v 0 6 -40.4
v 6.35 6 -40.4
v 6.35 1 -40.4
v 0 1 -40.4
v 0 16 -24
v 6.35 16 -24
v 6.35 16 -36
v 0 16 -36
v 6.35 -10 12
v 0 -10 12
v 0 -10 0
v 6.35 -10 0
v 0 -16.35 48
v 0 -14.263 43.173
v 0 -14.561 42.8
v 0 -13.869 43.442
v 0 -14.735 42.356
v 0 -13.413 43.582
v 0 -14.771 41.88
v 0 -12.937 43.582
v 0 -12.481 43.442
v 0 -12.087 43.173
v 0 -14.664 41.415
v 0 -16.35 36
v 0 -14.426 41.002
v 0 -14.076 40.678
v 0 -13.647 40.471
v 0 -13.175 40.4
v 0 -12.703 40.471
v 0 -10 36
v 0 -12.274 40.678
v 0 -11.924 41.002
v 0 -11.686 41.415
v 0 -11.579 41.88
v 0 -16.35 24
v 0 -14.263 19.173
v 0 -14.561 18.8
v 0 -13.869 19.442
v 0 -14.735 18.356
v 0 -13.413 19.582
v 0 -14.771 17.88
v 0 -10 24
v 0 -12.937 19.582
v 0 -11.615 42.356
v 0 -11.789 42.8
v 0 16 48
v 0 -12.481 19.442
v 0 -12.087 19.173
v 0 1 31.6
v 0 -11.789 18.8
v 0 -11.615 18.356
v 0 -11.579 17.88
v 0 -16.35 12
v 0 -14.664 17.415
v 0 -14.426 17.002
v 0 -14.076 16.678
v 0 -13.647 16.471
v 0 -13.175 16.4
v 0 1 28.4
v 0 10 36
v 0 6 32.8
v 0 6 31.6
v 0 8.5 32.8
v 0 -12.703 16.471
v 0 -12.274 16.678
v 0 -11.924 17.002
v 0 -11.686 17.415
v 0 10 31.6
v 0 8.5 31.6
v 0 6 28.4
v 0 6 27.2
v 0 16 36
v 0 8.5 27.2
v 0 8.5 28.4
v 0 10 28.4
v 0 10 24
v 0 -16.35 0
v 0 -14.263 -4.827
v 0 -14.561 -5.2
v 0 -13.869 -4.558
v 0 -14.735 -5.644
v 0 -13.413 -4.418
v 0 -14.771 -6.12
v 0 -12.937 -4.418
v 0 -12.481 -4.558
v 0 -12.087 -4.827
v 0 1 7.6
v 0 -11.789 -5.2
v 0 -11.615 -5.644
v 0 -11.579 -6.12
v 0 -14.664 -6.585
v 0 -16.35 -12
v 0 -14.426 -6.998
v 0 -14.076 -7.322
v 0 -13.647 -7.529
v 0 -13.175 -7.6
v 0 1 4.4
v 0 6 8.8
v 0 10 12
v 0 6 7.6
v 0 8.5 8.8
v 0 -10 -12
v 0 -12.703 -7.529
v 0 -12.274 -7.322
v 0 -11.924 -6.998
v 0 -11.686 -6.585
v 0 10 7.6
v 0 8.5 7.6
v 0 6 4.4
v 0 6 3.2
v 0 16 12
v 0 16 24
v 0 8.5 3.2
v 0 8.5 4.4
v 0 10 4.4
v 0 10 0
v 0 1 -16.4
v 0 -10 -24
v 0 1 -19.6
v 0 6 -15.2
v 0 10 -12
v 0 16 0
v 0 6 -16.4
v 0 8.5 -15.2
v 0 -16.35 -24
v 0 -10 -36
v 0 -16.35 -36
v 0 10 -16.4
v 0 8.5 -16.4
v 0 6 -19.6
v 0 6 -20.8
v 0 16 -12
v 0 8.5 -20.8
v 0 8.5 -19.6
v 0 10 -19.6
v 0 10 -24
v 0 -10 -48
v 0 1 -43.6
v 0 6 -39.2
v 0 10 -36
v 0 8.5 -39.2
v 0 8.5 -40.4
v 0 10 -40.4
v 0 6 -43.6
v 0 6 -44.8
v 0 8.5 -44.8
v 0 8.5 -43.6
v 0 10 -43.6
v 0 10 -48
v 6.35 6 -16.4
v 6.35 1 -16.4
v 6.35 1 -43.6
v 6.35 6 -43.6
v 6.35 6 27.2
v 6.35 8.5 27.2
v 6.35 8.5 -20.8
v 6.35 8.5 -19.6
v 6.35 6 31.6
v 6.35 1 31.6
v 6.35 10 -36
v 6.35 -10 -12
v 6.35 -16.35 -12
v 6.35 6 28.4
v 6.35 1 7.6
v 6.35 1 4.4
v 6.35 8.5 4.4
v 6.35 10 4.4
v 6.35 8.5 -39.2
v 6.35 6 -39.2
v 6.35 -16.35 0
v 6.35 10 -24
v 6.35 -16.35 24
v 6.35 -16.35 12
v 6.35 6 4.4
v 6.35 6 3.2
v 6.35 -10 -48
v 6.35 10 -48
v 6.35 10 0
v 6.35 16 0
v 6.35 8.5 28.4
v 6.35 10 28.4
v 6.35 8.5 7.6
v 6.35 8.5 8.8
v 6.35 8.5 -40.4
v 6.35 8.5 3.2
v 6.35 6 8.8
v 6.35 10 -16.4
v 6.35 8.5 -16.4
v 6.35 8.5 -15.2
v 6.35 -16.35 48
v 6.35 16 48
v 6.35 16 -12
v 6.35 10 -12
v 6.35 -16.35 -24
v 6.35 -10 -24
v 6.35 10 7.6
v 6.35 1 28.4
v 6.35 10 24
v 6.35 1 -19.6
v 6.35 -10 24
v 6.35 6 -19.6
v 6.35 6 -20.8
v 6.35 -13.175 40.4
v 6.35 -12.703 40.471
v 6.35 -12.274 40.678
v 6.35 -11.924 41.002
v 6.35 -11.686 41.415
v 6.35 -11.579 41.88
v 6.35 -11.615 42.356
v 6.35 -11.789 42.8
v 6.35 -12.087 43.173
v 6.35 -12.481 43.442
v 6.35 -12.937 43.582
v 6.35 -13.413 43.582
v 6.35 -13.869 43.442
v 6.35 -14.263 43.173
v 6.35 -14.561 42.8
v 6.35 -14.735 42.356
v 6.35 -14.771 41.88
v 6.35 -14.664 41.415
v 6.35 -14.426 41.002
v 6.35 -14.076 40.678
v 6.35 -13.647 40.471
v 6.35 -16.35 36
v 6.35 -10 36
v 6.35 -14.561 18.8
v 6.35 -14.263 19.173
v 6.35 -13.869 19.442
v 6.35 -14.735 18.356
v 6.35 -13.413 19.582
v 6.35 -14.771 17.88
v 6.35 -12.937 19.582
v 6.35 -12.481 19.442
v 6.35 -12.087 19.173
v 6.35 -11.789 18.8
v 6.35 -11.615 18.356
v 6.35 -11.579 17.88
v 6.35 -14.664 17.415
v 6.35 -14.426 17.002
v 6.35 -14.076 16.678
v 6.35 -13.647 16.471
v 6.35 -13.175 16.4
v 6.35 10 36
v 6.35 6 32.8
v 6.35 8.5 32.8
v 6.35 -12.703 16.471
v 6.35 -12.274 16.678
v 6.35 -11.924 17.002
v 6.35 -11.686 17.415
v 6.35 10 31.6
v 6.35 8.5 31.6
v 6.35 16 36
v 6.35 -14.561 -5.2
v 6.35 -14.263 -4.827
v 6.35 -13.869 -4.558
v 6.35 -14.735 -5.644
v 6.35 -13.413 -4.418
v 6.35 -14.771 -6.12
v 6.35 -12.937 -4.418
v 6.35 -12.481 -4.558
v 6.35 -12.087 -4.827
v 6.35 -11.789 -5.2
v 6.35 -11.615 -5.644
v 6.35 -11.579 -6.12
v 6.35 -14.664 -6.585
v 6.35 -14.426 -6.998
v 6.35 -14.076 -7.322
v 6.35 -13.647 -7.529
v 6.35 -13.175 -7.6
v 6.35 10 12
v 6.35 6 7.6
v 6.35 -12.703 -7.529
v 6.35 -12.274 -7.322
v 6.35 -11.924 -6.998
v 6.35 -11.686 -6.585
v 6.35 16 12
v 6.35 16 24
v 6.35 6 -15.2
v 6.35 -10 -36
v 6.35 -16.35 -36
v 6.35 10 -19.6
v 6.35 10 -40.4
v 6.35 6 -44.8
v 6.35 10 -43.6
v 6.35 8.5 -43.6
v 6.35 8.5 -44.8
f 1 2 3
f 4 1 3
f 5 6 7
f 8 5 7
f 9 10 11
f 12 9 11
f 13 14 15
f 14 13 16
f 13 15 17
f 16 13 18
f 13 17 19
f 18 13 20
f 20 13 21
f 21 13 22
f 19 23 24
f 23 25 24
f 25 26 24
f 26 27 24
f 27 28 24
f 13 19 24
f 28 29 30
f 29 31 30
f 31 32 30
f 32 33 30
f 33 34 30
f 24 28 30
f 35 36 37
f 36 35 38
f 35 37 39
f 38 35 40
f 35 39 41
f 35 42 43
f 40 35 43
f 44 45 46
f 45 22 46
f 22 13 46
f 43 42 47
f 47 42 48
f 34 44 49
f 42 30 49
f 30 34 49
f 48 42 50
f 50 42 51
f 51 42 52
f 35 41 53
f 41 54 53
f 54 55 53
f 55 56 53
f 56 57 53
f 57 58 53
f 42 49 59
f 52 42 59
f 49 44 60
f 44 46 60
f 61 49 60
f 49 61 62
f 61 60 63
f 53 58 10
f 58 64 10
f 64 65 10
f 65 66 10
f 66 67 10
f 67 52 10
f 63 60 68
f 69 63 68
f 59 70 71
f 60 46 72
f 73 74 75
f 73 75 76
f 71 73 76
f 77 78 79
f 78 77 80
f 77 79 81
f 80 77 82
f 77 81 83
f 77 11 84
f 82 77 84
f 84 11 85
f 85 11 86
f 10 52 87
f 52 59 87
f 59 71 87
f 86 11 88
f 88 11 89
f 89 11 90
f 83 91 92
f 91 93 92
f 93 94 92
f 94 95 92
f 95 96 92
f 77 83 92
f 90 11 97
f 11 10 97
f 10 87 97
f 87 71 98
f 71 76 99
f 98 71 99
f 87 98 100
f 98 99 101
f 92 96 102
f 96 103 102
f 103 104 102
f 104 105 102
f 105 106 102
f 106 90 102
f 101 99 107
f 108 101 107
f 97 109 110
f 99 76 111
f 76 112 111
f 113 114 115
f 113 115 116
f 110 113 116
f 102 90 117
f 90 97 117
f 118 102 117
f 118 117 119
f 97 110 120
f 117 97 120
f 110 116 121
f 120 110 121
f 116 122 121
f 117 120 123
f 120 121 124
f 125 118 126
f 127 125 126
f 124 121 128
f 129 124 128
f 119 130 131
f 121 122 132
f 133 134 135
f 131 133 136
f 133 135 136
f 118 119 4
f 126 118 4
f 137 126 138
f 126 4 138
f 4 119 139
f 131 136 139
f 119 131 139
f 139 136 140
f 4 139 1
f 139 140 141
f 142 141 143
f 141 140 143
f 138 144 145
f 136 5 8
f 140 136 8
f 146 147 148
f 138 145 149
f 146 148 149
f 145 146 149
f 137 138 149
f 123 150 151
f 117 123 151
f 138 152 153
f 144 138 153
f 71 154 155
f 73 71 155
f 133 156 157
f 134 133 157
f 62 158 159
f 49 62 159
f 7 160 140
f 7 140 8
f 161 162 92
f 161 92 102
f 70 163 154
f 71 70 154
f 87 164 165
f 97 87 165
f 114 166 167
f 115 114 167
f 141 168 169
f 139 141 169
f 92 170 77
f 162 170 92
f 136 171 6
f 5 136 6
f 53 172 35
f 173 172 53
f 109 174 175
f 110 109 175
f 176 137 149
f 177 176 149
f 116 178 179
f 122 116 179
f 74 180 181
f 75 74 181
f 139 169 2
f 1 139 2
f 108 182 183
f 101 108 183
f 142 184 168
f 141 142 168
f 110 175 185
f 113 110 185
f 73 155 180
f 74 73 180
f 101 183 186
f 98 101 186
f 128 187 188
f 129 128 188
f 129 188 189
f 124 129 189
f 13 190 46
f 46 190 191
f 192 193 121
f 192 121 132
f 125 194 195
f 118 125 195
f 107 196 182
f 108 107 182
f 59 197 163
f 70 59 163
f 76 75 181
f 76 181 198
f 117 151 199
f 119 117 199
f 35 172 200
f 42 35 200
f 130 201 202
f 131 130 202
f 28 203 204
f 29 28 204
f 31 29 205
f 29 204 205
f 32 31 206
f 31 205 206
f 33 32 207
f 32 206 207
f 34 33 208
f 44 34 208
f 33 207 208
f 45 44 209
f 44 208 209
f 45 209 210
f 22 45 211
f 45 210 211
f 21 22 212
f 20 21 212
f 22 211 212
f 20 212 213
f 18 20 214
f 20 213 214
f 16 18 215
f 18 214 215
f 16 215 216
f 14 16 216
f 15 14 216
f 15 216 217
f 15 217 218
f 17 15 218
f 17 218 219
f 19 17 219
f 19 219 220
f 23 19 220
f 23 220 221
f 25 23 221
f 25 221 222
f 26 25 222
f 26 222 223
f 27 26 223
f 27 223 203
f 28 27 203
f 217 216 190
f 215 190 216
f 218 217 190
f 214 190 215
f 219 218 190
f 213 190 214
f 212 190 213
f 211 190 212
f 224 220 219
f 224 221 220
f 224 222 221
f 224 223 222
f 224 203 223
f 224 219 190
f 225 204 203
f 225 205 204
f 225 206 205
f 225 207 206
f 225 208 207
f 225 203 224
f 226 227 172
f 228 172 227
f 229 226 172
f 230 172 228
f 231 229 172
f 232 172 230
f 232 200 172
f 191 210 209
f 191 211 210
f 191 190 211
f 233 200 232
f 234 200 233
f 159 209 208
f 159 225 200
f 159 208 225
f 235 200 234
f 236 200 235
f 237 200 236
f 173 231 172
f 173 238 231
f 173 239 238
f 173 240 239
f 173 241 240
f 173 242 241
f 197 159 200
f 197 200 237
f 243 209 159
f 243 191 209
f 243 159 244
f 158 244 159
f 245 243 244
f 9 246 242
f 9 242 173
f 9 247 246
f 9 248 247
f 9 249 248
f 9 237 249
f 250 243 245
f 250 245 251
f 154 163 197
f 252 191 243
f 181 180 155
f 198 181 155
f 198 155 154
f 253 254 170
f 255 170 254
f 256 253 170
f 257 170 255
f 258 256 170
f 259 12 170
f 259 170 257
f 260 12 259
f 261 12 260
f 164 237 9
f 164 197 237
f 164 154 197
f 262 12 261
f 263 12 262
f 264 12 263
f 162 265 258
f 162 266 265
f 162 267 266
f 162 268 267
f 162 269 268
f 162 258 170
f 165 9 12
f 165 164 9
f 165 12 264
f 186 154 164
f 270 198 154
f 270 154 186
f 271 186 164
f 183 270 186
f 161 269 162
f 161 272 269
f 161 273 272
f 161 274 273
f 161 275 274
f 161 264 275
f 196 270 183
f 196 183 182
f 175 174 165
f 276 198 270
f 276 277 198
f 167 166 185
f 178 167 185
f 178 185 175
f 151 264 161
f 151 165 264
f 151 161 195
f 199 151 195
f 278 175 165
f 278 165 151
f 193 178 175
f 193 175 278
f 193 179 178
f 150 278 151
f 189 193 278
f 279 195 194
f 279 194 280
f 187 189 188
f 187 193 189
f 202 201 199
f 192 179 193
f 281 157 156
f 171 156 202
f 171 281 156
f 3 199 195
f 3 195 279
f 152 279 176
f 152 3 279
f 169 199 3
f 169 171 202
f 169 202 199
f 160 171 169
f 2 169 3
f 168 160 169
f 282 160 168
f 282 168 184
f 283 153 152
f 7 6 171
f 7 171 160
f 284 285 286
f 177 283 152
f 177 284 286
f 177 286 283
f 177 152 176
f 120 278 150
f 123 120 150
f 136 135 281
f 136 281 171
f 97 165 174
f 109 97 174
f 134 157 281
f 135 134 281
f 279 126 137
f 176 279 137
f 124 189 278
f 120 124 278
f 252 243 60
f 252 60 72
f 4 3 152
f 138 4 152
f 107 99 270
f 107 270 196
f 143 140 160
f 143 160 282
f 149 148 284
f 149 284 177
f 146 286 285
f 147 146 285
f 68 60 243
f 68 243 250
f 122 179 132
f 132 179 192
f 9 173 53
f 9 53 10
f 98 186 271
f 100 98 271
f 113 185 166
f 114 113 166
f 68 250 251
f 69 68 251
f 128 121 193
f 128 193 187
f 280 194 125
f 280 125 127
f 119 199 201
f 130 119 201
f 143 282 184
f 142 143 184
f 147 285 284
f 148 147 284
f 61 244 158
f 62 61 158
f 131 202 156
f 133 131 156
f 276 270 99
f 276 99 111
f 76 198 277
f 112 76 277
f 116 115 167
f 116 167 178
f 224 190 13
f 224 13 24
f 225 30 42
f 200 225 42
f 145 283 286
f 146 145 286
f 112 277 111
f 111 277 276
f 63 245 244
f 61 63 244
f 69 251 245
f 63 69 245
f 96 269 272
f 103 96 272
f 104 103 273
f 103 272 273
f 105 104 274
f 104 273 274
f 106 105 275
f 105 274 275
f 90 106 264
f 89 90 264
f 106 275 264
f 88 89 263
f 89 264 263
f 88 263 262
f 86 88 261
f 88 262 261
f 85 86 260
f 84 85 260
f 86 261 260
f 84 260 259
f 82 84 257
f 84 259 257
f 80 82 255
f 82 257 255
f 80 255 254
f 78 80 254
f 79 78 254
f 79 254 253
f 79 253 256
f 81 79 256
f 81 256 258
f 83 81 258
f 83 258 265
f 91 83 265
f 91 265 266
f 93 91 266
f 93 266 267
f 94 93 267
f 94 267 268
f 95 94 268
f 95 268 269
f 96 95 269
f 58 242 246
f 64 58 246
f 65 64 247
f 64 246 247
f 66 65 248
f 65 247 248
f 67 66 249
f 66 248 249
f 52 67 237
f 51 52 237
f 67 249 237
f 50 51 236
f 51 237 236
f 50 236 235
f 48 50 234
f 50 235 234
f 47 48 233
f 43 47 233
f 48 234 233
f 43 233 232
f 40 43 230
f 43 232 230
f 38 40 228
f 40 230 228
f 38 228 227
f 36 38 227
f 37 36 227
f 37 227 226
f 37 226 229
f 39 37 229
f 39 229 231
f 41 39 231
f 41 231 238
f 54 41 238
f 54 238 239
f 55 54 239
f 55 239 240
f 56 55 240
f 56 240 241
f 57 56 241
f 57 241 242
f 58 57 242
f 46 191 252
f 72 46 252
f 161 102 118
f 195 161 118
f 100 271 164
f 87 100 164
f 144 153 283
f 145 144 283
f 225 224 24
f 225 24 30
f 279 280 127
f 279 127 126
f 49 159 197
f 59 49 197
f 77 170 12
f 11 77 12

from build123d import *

# Parameters (mm, degrees)
SKETCH1_W           = 96
SKETCH1_H           = 20
BOSS_EXTRUDE1_DEPTH = 6.35
SKETCH2_W           = 12
SKETCH2_H           = 6
SKETCH2_H_2         = 6.35
BOSS_EXTRUDE2_DEPTH = 6.35
SKETCH3_R           = 1.6
CUT_EXTRUDE1_DEPTH  = 10


with BuildPart() as part:
    # Sketch1 → Boss-Extrude1 (new body)
    with BuildSketch(Plane(origin=(0, 0, 0), x_dir=(0, 0, -1), z_dir=(1, 0, 0))):
        Rectangle(SKETCH1_W, SKETCH1_H)
    extrude(amount=BOSS_EXTRUDE1_DEPTH)

    # Sketch2 → Boss-Extrude2 (add)
    with BuildSketch(Plane(origin=(6.35, 0, 0), x_dir=(0, 0, -1), z_dir=(1, 0, 0))):
        with Locations((-18, 13)):
            Rectangle(SKETCH2_W, SKETCH2_H)
        with Locations((-42, 13)):
            Rectangle(SKETCH2_W, SKETCH2_H)
        with Locations((6, 13)):
            Rectangle(SKETCH2_W, SKETCH2_H)
        with Locations((30, 13)):
            Rectangle(SKETCH2_W, SKETCH2_H)
        with Locations((6, -13.175)):
            Rectangle(SKETCH2_W, SKETCH2_H_2)
        with Locations((30, -13.175)):
            Rectangle(SKETCH2_W, SKETCH2_H_2)
        with Locations((-18, -13.175)):
            Rectangle(SKETCH2_W, SKETCH2_H_2)
        with Locations((-42, -13.175)):
            Rectangle(SKETCH2_W, SKETCH2_H_2)
    extrude(amount=-BOSS_EXTRUDE2_DEPTH)

    # Sketch3 → Cut-Extrude1 (cut)
    with BuildSketch(Plane(origin=(6.35, 0, 0), x_dir=(0, 0, -1), z_dir=(1, 0, 0))):
        with Locations((-42, -13.175)):
            Circle(SKETCH3_R)
        with Locations((-18, -13.175)):
            Circle(SKETCH3_R)
        with Locations((6, -13.175)):
            Circle(SKETCH3_R)
        Polygon((-31.6, 10), (-31.6, 8.5), (-32.8, 8.5), (-32.8, 6), (-31.6, 6), (-31.6, 1), (-28.4, 1), (-28.4, 6), (-27.2, 6), (-27.2, 8.5), (-28.4, 8.5), (-28.4, 10), align=None)
        Polygon((-7.6, 10), (-7.6, 8.5), (-8.8, 8.5), (-8.8, 6), (-7.6, 6), (-7.6, 1), (-4.4, 1), (-4.4, 6), (-3.2, 6), (-3.2, 8.5), (-4.4, 8.5), (-4.4, 10), align=None)
        Polygon((16.4, 10), (16.4, 8.5), (15.2, 8.5), (15.2, 6), (16.4, 6), (16.4, 1), (19.6, 1), (19.6, 6), (20.8, 6), (20.8, 8.5), (19.6, 8.5), (19.6, 10), align=None)
        Polygon((40.4, 10), (40.4, 8.5), (39.2, 8.5), (39.2, 6), (40.4, 6), (40.4, 1), (43.6, 1), (43.6, 6), (44.8, 6), (44.8, 8.5), (43.6, 8.5), (43.6, 10), align=None)
    extrude(amount=-CUT_EXTRUDE1_DEPTH, mode=Mode.SUBTRACT)


solid = part.part
